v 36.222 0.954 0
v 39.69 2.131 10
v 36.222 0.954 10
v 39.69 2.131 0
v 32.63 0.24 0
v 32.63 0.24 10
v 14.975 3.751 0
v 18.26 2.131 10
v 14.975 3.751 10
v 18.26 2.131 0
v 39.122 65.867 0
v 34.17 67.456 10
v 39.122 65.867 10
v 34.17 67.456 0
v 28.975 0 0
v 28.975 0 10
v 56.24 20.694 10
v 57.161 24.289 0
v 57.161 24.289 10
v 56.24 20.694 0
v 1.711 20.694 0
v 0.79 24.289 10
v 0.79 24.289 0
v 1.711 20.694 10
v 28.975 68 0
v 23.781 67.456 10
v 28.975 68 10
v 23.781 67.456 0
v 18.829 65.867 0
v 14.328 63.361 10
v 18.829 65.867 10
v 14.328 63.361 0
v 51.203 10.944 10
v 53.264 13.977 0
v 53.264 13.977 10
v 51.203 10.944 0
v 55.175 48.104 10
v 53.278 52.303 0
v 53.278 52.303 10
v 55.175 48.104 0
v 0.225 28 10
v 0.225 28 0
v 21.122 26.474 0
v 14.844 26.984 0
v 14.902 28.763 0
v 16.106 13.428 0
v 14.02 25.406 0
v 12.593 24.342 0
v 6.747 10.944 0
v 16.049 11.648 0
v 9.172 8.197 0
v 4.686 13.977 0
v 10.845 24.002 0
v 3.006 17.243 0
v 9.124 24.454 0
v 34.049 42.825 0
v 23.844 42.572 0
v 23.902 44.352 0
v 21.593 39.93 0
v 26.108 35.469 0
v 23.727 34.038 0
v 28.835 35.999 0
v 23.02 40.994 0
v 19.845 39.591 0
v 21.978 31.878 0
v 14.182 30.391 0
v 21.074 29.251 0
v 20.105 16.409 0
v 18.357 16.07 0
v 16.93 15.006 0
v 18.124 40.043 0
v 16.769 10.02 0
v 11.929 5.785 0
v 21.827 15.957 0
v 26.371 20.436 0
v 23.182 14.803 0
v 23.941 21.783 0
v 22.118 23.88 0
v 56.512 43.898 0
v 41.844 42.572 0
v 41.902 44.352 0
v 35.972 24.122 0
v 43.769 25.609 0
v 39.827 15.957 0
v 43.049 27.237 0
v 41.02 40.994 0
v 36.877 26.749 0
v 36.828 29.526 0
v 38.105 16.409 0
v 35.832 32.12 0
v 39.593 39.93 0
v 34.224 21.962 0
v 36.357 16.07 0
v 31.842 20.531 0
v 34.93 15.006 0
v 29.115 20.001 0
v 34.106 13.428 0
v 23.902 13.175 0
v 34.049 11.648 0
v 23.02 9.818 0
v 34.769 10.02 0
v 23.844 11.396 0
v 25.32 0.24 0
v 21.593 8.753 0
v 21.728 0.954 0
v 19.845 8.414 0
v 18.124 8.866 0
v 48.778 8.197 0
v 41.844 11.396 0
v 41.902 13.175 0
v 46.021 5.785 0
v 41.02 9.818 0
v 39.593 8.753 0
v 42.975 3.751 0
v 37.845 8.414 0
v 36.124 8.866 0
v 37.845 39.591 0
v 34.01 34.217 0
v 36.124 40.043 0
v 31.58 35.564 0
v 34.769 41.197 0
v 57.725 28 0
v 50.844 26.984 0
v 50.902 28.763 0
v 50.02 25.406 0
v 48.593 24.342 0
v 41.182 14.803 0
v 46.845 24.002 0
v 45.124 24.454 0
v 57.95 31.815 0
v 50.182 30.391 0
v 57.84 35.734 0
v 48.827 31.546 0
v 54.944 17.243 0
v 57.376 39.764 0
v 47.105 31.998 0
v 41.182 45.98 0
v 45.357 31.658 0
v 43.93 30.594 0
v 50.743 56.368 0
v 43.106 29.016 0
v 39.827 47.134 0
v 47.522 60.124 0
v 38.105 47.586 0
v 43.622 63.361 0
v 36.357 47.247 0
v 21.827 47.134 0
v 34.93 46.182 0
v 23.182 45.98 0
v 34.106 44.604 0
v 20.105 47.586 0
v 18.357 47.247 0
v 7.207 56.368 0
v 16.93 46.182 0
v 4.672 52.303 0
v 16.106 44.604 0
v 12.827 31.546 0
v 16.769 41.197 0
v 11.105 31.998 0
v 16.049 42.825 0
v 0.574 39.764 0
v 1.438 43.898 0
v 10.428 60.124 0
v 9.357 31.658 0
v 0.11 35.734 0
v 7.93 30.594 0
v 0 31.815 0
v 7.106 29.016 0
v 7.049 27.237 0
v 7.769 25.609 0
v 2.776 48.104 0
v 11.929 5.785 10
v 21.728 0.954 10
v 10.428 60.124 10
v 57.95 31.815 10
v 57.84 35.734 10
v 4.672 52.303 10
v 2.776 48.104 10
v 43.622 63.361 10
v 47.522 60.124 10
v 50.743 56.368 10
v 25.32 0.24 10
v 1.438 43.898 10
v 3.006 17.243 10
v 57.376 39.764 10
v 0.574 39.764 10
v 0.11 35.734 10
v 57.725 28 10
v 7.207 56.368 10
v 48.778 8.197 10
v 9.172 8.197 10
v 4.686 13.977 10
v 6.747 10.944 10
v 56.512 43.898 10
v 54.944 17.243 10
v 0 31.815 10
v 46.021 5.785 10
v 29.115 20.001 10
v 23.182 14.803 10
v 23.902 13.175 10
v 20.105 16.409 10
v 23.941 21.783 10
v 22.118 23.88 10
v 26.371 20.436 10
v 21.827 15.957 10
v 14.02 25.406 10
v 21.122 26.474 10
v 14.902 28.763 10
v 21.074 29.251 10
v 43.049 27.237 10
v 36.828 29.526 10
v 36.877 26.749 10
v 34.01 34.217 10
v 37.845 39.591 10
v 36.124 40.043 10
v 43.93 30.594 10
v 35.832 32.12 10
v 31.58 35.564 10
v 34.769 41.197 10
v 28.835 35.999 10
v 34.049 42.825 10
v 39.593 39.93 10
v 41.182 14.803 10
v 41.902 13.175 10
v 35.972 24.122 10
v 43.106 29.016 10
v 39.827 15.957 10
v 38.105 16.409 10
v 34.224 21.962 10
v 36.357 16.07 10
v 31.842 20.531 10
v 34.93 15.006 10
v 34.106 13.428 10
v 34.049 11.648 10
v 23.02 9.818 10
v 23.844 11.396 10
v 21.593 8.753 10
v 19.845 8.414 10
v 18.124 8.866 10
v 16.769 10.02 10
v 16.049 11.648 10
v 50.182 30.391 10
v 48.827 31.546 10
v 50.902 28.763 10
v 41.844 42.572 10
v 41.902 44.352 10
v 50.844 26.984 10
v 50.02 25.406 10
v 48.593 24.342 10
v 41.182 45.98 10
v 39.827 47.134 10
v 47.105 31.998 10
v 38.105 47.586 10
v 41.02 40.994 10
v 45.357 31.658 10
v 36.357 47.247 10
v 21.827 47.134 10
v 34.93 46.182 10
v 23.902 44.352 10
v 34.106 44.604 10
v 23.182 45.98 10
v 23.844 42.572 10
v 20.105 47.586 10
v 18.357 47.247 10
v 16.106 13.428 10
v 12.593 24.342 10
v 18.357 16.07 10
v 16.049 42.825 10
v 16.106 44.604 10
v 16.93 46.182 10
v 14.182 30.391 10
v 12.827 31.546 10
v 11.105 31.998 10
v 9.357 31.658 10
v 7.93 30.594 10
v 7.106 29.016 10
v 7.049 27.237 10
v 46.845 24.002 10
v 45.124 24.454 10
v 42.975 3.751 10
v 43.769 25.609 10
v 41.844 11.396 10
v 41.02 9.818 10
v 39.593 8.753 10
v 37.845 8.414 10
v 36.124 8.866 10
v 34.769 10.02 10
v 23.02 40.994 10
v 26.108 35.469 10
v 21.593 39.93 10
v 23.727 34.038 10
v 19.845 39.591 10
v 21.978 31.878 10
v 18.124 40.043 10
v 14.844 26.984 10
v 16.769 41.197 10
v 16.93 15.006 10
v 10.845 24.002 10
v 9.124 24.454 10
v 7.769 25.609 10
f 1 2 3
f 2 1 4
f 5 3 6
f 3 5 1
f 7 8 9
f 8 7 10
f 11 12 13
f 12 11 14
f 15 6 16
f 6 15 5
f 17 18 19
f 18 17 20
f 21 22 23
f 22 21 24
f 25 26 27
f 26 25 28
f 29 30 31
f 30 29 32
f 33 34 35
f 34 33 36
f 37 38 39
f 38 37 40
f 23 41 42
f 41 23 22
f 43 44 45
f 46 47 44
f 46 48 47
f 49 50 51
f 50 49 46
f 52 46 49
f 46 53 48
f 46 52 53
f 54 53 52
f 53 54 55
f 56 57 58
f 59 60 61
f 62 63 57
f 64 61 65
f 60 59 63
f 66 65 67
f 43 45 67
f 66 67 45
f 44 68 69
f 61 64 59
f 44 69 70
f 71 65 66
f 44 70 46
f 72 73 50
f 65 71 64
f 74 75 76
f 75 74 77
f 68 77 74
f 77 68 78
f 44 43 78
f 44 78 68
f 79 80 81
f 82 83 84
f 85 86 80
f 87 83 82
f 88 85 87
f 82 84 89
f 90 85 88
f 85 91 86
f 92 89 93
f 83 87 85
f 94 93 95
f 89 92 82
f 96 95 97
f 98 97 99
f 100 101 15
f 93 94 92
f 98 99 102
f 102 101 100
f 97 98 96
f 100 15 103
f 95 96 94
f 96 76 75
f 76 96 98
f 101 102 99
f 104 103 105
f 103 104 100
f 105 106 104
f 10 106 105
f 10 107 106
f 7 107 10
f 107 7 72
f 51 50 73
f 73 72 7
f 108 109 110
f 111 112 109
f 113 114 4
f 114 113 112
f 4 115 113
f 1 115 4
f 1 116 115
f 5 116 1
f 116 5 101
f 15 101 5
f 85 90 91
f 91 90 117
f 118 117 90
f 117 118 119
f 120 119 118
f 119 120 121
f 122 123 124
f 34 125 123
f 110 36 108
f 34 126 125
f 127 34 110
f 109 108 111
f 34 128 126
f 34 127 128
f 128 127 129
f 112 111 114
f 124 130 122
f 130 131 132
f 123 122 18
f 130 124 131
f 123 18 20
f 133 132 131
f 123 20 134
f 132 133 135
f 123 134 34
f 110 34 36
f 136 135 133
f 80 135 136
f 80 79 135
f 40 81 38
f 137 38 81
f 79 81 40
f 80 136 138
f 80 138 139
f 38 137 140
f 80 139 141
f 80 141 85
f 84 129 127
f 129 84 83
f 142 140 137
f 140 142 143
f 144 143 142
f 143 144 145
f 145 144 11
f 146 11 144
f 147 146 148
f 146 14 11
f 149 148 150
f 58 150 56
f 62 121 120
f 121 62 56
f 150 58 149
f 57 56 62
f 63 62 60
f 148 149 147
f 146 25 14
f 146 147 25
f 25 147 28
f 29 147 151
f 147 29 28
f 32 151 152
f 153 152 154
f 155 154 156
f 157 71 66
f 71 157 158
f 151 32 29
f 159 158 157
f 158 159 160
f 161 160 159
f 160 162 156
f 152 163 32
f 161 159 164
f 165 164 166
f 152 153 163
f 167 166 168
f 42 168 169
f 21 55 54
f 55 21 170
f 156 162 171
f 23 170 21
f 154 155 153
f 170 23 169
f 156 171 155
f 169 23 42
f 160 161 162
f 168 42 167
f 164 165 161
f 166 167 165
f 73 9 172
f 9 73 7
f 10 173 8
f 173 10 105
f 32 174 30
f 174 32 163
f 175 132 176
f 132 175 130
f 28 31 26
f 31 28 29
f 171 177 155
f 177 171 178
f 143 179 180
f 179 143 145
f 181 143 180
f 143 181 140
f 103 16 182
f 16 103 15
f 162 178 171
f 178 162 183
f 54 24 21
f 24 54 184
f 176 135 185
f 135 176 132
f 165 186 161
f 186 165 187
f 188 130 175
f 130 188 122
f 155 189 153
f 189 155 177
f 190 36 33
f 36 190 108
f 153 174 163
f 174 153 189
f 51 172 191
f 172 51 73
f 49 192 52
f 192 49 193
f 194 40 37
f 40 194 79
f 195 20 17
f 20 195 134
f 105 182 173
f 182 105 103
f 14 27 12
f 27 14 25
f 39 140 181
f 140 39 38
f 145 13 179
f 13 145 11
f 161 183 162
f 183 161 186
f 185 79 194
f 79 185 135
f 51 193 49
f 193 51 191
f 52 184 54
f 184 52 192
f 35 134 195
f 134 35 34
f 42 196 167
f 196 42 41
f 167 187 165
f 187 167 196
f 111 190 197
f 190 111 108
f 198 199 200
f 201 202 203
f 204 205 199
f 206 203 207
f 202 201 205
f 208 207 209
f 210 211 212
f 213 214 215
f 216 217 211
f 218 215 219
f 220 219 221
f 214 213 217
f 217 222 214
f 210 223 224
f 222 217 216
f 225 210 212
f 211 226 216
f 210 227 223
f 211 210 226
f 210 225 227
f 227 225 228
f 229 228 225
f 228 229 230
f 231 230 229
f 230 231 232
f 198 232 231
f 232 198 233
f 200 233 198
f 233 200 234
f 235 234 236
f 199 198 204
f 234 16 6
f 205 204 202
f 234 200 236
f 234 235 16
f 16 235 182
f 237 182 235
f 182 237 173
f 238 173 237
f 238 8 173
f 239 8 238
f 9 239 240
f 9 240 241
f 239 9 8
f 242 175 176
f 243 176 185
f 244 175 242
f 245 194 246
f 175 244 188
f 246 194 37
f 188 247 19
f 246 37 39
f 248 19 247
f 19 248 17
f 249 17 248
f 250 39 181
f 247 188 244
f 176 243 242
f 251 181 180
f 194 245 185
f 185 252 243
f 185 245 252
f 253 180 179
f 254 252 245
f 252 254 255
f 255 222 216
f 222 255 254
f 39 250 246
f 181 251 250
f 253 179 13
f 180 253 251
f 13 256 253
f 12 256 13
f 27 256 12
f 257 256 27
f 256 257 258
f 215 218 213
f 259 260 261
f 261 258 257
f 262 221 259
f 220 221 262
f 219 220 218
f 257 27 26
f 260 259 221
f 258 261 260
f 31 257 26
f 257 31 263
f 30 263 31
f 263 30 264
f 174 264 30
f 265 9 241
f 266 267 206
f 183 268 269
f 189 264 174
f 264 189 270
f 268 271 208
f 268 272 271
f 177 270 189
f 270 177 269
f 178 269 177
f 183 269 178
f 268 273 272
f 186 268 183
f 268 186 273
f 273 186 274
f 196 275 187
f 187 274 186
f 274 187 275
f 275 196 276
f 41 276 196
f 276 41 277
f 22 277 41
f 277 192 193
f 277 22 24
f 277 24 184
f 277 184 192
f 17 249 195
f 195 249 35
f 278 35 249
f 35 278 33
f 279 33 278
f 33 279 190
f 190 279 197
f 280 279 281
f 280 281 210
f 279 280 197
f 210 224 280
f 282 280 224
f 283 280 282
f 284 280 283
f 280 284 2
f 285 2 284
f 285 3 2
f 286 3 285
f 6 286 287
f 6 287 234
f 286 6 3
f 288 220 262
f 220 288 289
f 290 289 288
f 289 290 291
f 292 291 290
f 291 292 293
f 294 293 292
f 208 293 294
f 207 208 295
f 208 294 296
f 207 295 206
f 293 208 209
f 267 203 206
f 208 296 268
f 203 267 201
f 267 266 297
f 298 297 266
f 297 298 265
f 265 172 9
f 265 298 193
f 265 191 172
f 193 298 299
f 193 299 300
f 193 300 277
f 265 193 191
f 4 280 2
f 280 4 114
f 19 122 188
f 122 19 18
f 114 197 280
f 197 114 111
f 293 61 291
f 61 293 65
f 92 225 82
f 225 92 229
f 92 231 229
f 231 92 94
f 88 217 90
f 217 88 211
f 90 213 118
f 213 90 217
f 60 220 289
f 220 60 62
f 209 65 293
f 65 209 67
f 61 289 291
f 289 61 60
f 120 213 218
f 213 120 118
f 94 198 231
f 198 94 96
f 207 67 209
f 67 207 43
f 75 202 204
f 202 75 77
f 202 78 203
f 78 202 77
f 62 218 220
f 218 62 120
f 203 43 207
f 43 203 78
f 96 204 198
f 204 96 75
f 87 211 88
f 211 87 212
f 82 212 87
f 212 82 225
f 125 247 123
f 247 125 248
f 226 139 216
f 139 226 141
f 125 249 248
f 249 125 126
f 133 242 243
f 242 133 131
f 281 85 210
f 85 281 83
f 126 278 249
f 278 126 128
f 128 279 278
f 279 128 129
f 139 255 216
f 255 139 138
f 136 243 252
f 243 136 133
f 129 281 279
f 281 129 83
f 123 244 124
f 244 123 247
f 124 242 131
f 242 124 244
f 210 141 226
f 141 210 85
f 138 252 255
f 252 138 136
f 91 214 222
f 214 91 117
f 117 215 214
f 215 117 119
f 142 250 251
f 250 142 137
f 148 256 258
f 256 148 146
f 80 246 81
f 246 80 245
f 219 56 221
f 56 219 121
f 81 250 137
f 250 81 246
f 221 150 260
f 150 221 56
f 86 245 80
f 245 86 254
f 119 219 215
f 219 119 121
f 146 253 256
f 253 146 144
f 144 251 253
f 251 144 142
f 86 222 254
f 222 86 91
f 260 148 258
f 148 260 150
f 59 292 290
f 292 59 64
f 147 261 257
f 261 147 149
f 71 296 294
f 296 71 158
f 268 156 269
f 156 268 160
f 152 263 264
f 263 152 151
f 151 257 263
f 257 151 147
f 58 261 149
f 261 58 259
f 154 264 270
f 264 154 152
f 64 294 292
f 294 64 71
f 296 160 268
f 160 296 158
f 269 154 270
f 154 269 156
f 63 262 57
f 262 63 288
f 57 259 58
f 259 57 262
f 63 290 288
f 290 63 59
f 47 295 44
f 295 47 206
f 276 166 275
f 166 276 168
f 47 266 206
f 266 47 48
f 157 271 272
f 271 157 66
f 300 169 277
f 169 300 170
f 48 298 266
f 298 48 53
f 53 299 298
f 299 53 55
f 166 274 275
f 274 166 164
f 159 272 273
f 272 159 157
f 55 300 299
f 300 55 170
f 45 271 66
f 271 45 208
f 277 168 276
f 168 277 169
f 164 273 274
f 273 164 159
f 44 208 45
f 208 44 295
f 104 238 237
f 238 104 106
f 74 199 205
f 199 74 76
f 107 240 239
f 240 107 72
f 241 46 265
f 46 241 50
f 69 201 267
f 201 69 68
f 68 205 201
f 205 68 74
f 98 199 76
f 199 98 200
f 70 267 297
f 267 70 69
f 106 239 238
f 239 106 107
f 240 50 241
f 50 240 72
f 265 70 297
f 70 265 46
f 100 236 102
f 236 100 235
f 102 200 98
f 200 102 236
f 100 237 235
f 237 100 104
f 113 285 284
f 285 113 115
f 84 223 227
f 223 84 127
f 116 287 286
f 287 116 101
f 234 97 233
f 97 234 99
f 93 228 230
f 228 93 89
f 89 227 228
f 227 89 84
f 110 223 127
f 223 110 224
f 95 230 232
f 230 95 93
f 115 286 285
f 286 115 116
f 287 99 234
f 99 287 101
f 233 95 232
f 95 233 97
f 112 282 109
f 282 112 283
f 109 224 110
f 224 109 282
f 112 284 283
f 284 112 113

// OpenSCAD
$fn = 32;

// ----------------------------------------------------------------------
// Cam plate: single_lobe cam, base R28
// ----------------------------------------------------------------------

// --- parameters (mm) ---
base_r = 28;              // base circle radius
lobe_h = 12;              // cam lobe rise
bore_r = 8;               // shaft bore radius
plate_t = 10;             // plate thickness, Z (extrusion height)
ring_r = 18;              // lightening ring radius
bolt_r = 4;               // lightening hole radius

profile = [[57.725, 28], [57.95, 31.815], [57.84, 35.734], [57.376, 39.764], [56.512, 43.898], [55.175, 48.104], [53.278, 52.303], [50.743, 56.368], [47.522, 60.124], [43.622, 63.361], [39.122, 65.867], [34.17, 67.456], [28.975, 68], [23.781, 67.456], [18.829, 65.867], [14.328, 63.361], [10.428, 60.124], [7.207, 56.368], [4.672, 52.303], [2.776, 48.104], [1.438, 43.898], [0.574, 39.764], [0.11, 35.734], [0, 31.815], [0.225, 28], [0.79, 24.289], [1.711, 20.694], [3.006, 17.243], [4.686, 13.977], [6.747, 10.944], [9.172, 8.197], [11.929, 5.785], [14.975, 3.751], [18.26, 2.131], [21.728, 0.954], [25.32, 0.24], [28.975, 0], [32.63, 0.24], [36.222, 0.954], [39.69, 2.131], [42.975, 3.751], [46.021, 5.785], [48.778, 8.197], [51.203, 10.944], [53.264, 13.977], [54.944, 17.243], [56.24, 20.694], [57.161, 24.289]];  // primary outline, 48 points, counter clockwise
void_1 = [[36.828, 29.526], [35.832, 32.12], [34.01, 34.217], [31.58, 35.564], [28.835, 35.999], [26.108, 35.469], [23.727, 34.038], [21.978, 31.878], [21.074, 29.251], [21.122, 26.474], [22.118, 23.88], [23.941, 21.783], [26.371, 20.436], [29.115, 20.001], [31.842, 20.531], [34.224, 21.962], [35.972, 24.122], [36.877, 26.749]];  // shaft bore, 18 points
void_2 = [[50.902, 28.763], [50.182, 30.391], [48.827, 31.546], [47.105, 31.998], [45.357, 31.658], [43.93, 30.594], [43.106, 29.016], [43.049, 27.237], [43.769, 25.609], [45.124, 24.454], [46.845, 24.002], [48.593, 24.342], [50.02, 25.406], [50.844, 26.984]];  // lightening hole 1, 14 points
void_3 = [[41.902, 44.352], [41.182, 45.98], [39.827, 47.134], [38.105, 47.586], [36.357, 47.247], [34.93, 46.182], [34.106, 44.604], [34.049, 42.825], [34.769, 41.197], [36.124, 40.043], [37.845, 39.591], [39.593, 39.93], [41.02, 40.994], [41.844, 42.572]];  // lightening hole 2, 14 points
void_4 = [[23.902, 44.352], [23.182, 45.98], [21.827, 47.134], [20.105, 47.586], [18.357, 47.247], [16.93, 46.182], [16.106, 44.604], [16.049, 42.825], [16.769, 41.197], [18.124, 40.043], [19.845, 39.591], [21.593, 39.93], [23.02, 40.994], [23.844, 42.572]];  // lightening hole 3, 14 points
void_5 = [[14.902, 28.763], [14.182, 30.391], [12.827, 31.546], [11.105, 31.998], [9.357, 31.658], [7.93, 30.594], [7.106, 29.016], [7.049, 27.237], [7.769, 25.609], [9.124, 24.454], [10.845, 24.002], [12.593, 24.342], [14.02, 25.406], [14.844, 26.984]];  // lightening hole 4, 14 points
void_6 = [[23.902, 13.175], [23.182, 14.803], [21.827, 15.957], [20.105, 16.409], [18.357, 16.07], [16.93, 15.006], [16.106, 13.428], [16.049, 11.648], [16.769, 10.02], [18.124, 8.866], [19.845, 8.414], [21.593, 8.753], [23.02, 9.818], [23.844, 11.396]];  // lightening hole 5, 14 points
void_7 = [[41.902, 13.175], [41.182, 14.803], [39.827, 15.957], [38.105, 16.409], [36.357, 16.07], [34.93, 15.006], [34.106, 13.428], [34.049, 11.648], [34.769, 10.02], [36.124, 8.866], [37.845, 8.414], [39.593, 8.753], [41.02, 9.818], [41.844, 11.396]];  // lightening hole 6, 14 points

// --- the one profile operation ---
difference() {
  linear_extrude(height = plate_t) polygon(points = profile);
  translate([0, 0, -1])
    linear_extrude(height = plate_t + 2) polygon(points = void_1);
  translate([0, 0, -1])
    linear_extrude(height = plate_t + 2) polygon(points = void_2);
  translate([0, 0, -1])
    linear_extrude(height = plate_t + 2) polygon(points = void_3);
  translate([0, 0, -1])
    linear_extrude(height = plate_t + 2) polygon(points = void_4);
  translate([0, 0, -1])
    linear_extrude(height = plate_t + 2) polygon(points = void_5);
  translate([0, 0, -1])
    linear_extrude(height = plate_t + 2) polygon(points = void_6);
  translate([0, 0, -1])
    linear_extrude(height = plate_t + 2) polygon(points = void_7);
}
